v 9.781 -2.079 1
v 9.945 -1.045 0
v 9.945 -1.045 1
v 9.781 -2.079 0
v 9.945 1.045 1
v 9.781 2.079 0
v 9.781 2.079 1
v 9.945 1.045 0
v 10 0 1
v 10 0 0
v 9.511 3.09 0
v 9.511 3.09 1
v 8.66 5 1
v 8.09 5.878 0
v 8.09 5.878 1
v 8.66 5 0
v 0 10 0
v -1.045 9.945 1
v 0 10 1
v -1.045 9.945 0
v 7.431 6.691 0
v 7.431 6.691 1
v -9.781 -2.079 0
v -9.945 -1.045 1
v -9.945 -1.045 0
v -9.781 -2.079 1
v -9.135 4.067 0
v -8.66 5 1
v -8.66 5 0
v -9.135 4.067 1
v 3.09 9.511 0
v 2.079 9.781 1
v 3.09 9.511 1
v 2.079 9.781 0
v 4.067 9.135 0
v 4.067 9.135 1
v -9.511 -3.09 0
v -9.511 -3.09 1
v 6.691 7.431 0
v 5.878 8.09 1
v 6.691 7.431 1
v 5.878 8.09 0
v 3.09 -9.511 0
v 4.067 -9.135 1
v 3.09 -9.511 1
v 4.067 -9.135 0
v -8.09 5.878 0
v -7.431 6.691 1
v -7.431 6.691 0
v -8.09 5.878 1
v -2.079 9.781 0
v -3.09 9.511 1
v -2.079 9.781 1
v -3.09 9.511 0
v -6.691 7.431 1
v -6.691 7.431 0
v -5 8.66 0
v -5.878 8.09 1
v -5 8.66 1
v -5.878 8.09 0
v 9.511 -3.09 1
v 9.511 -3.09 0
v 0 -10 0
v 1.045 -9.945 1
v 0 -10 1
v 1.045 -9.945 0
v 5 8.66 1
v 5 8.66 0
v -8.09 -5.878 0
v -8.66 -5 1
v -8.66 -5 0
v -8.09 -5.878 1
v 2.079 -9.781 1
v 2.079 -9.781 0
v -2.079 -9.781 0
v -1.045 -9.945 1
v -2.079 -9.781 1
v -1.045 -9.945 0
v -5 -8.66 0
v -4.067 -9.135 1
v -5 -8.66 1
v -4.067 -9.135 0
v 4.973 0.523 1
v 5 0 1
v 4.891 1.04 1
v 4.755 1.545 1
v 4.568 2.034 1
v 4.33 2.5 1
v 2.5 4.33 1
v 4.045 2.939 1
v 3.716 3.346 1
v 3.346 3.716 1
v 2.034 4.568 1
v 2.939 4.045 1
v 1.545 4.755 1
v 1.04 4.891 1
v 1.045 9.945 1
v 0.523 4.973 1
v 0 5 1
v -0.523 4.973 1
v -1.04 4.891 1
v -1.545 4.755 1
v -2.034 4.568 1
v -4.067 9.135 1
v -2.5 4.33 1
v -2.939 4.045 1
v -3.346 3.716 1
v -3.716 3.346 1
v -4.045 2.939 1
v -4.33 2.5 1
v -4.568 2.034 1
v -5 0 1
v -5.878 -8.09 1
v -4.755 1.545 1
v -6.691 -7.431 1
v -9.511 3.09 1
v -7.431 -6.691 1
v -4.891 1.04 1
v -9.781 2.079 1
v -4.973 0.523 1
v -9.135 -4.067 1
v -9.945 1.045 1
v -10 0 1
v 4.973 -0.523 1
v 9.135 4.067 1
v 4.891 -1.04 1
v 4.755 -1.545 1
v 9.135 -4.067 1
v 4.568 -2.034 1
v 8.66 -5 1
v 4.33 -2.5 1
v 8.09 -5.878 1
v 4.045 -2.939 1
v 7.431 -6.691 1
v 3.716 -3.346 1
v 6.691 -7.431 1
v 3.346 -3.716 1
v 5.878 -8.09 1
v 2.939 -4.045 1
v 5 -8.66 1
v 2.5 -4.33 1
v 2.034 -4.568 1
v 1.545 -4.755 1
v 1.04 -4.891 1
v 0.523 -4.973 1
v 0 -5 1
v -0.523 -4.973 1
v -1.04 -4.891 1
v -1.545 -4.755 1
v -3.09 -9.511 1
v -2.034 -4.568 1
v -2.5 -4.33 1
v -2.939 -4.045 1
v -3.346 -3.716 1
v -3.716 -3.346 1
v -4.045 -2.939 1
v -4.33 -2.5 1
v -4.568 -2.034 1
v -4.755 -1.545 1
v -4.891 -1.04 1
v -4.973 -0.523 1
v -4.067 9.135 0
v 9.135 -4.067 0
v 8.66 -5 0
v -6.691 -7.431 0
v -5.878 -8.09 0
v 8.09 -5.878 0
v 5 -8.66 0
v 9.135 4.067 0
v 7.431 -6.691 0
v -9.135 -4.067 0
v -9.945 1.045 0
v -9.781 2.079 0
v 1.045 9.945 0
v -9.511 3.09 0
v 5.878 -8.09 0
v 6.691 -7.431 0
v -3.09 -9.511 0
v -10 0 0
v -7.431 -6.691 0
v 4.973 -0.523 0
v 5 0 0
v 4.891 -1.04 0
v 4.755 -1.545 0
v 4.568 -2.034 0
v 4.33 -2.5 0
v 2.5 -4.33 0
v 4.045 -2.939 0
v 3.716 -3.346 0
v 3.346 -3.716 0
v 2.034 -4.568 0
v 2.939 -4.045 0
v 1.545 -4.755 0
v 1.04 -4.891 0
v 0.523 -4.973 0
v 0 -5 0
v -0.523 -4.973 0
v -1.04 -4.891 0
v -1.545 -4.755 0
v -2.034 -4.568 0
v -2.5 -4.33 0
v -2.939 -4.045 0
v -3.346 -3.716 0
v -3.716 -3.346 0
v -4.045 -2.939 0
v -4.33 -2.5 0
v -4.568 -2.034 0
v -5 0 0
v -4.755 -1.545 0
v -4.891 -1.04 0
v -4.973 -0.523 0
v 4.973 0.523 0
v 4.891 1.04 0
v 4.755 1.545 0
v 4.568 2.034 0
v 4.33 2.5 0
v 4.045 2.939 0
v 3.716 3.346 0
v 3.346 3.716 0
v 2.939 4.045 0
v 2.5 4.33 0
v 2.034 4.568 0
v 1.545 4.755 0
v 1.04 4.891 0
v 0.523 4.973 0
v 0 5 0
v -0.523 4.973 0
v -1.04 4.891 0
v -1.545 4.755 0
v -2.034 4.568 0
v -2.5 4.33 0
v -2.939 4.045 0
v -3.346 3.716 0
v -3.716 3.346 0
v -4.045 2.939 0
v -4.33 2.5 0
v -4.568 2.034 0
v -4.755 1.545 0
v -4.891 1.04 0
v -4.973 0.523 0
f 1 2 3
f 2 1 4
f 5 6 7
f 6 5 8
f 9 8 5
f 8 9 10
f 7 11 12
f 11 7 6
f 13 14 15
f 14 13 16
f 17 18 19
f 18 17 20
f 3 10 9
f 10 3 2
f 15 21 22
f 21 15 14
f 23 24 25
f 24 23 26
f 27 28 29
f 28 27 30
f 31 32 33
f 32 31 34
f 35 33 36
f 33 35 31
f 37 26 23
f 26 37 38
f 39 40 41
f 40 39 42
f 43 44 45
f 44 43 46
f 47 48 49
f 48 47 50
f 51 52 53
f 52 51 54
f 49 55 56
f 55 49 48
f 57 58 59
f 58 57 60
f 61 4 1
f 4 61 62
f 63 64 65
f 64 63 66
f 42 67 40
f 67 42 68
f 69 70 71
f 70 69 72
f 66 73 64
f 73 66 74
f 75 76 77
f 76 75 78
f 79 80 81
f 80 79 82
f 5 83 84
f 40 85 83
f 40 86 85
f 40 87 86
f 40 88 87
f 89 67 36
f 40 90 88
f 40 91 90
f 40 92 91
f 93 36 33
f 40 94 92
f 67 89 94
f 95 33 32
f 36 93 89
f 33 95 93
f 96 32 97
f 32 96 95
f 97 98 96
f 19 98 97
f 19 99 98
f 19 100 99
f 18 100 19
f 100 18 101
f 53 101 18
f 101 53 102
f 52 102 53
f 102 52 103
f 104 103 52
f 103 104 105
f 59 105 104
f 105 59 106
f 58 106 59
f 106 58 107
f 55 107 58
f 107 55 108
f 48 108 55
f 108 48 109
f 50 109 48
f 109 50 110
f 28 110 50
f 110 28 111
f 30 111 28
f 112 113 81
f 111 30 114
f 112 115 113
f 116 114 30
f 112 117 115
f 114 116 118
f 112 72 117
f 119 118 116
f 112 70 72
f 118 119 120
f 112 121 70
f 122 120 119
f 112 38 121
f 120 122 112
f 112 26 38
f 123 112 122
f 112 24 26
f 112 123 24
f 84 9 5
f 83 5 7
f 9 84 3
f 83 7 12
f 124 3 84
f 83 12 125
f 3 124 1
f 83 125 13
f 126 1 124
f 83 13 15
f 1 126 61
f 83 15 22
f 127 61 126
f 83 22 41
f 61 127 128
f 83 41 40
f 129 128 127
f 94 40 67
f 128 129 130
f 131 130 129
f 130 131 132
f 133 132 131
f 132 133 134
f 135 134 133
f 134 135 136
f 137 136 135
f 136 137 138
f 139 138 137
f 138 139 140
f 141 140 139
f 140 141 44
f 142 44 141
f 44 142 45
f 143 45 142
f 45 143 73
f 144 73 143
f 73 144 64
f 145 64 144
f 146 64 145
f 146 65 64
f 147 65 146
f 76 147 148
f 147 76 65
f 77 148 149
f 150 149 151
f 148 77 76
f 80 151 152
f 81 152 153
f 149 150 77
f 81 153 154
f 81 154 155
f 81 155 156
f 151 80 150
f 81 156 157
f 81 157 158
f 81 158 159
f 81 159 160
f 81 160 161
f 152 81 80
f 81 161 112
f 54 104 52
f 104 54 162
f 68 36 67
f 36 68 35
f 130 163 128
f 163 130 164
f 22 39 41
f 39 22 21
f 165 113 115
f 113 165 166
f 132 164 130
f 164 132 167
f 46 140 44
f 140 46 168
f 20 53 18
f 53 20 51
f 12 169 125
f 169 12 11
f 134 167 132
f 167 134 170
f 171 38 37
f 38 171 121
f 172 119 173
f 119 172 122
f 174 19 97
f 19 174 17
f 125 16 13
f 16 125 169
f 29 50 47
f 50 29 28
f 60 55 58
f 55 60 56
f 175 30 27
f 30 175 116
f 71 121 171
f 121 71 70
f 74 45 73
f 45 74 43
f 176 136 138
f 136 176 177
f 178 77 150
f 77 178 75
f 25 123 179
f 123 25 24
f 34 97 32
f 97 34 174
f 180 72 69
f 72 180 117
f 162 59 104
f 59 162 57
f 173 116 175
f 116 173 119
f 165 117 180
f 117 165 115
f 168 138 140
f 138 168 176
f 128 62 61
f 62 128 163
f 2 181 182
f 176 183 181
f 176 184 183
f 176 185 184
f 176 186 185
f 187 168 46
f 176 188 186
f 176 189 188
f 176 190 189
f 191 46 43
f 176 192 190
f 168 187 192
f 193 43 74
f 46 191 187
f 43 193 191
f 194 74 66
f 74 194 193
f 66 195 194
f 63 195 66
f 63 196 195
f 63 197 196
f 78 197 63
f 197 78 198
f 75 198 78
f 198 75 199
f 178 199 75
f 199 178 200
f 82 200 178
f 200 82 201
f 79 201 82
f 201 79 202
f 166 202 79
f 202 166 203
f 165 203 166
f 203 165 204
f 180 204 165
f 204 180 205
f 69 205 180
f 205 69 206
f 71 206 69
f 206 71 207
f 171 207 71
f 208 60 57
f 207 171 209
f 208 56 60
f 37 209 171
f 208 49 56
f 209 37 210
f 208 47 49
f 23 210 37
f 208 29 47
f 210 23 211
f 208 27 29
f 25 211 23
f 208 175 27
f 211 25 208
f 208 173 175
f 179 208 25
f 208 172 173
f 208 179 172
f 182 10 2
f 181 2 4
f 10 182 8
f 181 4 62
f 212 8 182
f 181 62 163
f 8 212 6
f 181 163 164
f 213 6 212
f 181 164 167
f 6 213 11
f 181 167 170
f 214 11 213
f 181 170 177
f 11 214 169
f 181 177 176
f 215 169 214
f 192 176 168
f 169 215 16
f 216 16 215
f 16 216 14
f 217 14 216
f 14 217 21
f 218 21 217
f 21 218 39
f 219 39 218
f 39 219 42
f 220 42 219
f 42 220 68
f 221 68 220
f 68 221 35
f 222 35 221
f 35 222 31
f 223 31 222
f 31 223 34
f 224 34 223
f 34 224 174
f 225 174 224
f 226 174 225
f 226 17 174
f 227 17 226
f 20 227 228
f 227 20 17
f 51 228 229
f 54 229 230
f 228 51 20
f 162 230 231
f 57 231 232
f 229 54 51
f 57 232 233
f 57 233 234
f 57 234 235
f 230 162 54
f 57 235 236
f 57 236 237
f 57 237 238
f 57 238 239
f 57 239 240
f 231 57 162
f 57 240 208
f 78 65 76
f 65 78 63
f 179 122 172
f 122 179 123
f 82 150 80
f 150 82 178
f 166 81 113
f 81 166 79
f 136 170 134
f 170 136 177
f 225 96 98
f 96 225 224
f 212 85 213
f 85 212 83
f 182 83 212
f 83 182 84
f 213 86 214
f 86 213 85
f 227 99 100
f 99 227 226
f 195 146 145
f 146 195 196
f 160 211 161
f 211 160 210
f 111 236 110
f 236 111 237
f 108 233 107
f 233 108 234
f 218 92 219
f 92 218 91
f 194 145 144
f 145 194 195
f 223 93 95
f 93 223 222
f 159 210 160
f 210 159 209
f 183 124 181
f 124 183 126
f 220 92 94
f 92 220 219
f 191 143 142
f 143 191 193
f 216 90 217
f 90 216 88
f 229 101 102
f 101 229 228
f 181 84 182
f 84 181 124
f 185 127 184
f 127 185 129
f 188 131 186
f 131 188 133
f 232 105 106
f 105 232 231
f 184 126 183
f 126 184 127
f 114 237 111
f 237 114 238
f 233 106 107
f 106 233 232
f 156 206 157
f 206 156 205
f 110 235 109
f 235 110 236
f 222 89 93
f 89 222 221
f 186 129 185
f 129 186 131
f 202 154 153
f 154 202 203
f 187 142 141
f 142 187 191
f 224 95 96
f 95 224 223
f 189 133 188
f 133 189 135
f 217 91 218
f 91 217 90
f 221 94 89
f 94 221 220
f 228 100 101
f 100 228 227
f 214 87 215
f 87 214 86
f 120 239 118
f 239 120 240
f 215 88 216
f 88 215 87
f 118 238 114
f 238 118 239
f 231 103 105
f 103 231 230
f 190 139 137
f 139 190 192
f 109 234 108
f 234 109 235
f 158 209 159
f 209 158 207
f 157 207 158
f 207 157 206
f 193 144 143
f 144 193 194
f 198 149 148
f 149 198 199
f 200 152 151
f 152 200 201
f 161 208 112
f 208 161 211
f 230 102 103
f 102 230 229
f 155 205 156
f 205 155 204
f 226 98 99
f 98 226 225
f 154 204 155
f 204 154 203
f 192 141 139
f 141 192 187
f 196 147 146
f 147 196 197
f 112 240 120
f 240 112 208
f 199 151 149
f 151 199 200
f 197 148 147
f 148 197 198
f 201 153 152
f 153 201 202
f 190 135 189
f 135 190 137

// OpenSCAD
// Precision shim ring.
$fn = 60;
eps = 0.02;
inner_d = 10;
outer_d = 20;
thickness = 1;
difference() {
    cylinder(d = outer_d, h = thickness);
    translate([0, 0, -eps]) cylinder(d = inner_d, h = thickness + 2 * eps);
}
